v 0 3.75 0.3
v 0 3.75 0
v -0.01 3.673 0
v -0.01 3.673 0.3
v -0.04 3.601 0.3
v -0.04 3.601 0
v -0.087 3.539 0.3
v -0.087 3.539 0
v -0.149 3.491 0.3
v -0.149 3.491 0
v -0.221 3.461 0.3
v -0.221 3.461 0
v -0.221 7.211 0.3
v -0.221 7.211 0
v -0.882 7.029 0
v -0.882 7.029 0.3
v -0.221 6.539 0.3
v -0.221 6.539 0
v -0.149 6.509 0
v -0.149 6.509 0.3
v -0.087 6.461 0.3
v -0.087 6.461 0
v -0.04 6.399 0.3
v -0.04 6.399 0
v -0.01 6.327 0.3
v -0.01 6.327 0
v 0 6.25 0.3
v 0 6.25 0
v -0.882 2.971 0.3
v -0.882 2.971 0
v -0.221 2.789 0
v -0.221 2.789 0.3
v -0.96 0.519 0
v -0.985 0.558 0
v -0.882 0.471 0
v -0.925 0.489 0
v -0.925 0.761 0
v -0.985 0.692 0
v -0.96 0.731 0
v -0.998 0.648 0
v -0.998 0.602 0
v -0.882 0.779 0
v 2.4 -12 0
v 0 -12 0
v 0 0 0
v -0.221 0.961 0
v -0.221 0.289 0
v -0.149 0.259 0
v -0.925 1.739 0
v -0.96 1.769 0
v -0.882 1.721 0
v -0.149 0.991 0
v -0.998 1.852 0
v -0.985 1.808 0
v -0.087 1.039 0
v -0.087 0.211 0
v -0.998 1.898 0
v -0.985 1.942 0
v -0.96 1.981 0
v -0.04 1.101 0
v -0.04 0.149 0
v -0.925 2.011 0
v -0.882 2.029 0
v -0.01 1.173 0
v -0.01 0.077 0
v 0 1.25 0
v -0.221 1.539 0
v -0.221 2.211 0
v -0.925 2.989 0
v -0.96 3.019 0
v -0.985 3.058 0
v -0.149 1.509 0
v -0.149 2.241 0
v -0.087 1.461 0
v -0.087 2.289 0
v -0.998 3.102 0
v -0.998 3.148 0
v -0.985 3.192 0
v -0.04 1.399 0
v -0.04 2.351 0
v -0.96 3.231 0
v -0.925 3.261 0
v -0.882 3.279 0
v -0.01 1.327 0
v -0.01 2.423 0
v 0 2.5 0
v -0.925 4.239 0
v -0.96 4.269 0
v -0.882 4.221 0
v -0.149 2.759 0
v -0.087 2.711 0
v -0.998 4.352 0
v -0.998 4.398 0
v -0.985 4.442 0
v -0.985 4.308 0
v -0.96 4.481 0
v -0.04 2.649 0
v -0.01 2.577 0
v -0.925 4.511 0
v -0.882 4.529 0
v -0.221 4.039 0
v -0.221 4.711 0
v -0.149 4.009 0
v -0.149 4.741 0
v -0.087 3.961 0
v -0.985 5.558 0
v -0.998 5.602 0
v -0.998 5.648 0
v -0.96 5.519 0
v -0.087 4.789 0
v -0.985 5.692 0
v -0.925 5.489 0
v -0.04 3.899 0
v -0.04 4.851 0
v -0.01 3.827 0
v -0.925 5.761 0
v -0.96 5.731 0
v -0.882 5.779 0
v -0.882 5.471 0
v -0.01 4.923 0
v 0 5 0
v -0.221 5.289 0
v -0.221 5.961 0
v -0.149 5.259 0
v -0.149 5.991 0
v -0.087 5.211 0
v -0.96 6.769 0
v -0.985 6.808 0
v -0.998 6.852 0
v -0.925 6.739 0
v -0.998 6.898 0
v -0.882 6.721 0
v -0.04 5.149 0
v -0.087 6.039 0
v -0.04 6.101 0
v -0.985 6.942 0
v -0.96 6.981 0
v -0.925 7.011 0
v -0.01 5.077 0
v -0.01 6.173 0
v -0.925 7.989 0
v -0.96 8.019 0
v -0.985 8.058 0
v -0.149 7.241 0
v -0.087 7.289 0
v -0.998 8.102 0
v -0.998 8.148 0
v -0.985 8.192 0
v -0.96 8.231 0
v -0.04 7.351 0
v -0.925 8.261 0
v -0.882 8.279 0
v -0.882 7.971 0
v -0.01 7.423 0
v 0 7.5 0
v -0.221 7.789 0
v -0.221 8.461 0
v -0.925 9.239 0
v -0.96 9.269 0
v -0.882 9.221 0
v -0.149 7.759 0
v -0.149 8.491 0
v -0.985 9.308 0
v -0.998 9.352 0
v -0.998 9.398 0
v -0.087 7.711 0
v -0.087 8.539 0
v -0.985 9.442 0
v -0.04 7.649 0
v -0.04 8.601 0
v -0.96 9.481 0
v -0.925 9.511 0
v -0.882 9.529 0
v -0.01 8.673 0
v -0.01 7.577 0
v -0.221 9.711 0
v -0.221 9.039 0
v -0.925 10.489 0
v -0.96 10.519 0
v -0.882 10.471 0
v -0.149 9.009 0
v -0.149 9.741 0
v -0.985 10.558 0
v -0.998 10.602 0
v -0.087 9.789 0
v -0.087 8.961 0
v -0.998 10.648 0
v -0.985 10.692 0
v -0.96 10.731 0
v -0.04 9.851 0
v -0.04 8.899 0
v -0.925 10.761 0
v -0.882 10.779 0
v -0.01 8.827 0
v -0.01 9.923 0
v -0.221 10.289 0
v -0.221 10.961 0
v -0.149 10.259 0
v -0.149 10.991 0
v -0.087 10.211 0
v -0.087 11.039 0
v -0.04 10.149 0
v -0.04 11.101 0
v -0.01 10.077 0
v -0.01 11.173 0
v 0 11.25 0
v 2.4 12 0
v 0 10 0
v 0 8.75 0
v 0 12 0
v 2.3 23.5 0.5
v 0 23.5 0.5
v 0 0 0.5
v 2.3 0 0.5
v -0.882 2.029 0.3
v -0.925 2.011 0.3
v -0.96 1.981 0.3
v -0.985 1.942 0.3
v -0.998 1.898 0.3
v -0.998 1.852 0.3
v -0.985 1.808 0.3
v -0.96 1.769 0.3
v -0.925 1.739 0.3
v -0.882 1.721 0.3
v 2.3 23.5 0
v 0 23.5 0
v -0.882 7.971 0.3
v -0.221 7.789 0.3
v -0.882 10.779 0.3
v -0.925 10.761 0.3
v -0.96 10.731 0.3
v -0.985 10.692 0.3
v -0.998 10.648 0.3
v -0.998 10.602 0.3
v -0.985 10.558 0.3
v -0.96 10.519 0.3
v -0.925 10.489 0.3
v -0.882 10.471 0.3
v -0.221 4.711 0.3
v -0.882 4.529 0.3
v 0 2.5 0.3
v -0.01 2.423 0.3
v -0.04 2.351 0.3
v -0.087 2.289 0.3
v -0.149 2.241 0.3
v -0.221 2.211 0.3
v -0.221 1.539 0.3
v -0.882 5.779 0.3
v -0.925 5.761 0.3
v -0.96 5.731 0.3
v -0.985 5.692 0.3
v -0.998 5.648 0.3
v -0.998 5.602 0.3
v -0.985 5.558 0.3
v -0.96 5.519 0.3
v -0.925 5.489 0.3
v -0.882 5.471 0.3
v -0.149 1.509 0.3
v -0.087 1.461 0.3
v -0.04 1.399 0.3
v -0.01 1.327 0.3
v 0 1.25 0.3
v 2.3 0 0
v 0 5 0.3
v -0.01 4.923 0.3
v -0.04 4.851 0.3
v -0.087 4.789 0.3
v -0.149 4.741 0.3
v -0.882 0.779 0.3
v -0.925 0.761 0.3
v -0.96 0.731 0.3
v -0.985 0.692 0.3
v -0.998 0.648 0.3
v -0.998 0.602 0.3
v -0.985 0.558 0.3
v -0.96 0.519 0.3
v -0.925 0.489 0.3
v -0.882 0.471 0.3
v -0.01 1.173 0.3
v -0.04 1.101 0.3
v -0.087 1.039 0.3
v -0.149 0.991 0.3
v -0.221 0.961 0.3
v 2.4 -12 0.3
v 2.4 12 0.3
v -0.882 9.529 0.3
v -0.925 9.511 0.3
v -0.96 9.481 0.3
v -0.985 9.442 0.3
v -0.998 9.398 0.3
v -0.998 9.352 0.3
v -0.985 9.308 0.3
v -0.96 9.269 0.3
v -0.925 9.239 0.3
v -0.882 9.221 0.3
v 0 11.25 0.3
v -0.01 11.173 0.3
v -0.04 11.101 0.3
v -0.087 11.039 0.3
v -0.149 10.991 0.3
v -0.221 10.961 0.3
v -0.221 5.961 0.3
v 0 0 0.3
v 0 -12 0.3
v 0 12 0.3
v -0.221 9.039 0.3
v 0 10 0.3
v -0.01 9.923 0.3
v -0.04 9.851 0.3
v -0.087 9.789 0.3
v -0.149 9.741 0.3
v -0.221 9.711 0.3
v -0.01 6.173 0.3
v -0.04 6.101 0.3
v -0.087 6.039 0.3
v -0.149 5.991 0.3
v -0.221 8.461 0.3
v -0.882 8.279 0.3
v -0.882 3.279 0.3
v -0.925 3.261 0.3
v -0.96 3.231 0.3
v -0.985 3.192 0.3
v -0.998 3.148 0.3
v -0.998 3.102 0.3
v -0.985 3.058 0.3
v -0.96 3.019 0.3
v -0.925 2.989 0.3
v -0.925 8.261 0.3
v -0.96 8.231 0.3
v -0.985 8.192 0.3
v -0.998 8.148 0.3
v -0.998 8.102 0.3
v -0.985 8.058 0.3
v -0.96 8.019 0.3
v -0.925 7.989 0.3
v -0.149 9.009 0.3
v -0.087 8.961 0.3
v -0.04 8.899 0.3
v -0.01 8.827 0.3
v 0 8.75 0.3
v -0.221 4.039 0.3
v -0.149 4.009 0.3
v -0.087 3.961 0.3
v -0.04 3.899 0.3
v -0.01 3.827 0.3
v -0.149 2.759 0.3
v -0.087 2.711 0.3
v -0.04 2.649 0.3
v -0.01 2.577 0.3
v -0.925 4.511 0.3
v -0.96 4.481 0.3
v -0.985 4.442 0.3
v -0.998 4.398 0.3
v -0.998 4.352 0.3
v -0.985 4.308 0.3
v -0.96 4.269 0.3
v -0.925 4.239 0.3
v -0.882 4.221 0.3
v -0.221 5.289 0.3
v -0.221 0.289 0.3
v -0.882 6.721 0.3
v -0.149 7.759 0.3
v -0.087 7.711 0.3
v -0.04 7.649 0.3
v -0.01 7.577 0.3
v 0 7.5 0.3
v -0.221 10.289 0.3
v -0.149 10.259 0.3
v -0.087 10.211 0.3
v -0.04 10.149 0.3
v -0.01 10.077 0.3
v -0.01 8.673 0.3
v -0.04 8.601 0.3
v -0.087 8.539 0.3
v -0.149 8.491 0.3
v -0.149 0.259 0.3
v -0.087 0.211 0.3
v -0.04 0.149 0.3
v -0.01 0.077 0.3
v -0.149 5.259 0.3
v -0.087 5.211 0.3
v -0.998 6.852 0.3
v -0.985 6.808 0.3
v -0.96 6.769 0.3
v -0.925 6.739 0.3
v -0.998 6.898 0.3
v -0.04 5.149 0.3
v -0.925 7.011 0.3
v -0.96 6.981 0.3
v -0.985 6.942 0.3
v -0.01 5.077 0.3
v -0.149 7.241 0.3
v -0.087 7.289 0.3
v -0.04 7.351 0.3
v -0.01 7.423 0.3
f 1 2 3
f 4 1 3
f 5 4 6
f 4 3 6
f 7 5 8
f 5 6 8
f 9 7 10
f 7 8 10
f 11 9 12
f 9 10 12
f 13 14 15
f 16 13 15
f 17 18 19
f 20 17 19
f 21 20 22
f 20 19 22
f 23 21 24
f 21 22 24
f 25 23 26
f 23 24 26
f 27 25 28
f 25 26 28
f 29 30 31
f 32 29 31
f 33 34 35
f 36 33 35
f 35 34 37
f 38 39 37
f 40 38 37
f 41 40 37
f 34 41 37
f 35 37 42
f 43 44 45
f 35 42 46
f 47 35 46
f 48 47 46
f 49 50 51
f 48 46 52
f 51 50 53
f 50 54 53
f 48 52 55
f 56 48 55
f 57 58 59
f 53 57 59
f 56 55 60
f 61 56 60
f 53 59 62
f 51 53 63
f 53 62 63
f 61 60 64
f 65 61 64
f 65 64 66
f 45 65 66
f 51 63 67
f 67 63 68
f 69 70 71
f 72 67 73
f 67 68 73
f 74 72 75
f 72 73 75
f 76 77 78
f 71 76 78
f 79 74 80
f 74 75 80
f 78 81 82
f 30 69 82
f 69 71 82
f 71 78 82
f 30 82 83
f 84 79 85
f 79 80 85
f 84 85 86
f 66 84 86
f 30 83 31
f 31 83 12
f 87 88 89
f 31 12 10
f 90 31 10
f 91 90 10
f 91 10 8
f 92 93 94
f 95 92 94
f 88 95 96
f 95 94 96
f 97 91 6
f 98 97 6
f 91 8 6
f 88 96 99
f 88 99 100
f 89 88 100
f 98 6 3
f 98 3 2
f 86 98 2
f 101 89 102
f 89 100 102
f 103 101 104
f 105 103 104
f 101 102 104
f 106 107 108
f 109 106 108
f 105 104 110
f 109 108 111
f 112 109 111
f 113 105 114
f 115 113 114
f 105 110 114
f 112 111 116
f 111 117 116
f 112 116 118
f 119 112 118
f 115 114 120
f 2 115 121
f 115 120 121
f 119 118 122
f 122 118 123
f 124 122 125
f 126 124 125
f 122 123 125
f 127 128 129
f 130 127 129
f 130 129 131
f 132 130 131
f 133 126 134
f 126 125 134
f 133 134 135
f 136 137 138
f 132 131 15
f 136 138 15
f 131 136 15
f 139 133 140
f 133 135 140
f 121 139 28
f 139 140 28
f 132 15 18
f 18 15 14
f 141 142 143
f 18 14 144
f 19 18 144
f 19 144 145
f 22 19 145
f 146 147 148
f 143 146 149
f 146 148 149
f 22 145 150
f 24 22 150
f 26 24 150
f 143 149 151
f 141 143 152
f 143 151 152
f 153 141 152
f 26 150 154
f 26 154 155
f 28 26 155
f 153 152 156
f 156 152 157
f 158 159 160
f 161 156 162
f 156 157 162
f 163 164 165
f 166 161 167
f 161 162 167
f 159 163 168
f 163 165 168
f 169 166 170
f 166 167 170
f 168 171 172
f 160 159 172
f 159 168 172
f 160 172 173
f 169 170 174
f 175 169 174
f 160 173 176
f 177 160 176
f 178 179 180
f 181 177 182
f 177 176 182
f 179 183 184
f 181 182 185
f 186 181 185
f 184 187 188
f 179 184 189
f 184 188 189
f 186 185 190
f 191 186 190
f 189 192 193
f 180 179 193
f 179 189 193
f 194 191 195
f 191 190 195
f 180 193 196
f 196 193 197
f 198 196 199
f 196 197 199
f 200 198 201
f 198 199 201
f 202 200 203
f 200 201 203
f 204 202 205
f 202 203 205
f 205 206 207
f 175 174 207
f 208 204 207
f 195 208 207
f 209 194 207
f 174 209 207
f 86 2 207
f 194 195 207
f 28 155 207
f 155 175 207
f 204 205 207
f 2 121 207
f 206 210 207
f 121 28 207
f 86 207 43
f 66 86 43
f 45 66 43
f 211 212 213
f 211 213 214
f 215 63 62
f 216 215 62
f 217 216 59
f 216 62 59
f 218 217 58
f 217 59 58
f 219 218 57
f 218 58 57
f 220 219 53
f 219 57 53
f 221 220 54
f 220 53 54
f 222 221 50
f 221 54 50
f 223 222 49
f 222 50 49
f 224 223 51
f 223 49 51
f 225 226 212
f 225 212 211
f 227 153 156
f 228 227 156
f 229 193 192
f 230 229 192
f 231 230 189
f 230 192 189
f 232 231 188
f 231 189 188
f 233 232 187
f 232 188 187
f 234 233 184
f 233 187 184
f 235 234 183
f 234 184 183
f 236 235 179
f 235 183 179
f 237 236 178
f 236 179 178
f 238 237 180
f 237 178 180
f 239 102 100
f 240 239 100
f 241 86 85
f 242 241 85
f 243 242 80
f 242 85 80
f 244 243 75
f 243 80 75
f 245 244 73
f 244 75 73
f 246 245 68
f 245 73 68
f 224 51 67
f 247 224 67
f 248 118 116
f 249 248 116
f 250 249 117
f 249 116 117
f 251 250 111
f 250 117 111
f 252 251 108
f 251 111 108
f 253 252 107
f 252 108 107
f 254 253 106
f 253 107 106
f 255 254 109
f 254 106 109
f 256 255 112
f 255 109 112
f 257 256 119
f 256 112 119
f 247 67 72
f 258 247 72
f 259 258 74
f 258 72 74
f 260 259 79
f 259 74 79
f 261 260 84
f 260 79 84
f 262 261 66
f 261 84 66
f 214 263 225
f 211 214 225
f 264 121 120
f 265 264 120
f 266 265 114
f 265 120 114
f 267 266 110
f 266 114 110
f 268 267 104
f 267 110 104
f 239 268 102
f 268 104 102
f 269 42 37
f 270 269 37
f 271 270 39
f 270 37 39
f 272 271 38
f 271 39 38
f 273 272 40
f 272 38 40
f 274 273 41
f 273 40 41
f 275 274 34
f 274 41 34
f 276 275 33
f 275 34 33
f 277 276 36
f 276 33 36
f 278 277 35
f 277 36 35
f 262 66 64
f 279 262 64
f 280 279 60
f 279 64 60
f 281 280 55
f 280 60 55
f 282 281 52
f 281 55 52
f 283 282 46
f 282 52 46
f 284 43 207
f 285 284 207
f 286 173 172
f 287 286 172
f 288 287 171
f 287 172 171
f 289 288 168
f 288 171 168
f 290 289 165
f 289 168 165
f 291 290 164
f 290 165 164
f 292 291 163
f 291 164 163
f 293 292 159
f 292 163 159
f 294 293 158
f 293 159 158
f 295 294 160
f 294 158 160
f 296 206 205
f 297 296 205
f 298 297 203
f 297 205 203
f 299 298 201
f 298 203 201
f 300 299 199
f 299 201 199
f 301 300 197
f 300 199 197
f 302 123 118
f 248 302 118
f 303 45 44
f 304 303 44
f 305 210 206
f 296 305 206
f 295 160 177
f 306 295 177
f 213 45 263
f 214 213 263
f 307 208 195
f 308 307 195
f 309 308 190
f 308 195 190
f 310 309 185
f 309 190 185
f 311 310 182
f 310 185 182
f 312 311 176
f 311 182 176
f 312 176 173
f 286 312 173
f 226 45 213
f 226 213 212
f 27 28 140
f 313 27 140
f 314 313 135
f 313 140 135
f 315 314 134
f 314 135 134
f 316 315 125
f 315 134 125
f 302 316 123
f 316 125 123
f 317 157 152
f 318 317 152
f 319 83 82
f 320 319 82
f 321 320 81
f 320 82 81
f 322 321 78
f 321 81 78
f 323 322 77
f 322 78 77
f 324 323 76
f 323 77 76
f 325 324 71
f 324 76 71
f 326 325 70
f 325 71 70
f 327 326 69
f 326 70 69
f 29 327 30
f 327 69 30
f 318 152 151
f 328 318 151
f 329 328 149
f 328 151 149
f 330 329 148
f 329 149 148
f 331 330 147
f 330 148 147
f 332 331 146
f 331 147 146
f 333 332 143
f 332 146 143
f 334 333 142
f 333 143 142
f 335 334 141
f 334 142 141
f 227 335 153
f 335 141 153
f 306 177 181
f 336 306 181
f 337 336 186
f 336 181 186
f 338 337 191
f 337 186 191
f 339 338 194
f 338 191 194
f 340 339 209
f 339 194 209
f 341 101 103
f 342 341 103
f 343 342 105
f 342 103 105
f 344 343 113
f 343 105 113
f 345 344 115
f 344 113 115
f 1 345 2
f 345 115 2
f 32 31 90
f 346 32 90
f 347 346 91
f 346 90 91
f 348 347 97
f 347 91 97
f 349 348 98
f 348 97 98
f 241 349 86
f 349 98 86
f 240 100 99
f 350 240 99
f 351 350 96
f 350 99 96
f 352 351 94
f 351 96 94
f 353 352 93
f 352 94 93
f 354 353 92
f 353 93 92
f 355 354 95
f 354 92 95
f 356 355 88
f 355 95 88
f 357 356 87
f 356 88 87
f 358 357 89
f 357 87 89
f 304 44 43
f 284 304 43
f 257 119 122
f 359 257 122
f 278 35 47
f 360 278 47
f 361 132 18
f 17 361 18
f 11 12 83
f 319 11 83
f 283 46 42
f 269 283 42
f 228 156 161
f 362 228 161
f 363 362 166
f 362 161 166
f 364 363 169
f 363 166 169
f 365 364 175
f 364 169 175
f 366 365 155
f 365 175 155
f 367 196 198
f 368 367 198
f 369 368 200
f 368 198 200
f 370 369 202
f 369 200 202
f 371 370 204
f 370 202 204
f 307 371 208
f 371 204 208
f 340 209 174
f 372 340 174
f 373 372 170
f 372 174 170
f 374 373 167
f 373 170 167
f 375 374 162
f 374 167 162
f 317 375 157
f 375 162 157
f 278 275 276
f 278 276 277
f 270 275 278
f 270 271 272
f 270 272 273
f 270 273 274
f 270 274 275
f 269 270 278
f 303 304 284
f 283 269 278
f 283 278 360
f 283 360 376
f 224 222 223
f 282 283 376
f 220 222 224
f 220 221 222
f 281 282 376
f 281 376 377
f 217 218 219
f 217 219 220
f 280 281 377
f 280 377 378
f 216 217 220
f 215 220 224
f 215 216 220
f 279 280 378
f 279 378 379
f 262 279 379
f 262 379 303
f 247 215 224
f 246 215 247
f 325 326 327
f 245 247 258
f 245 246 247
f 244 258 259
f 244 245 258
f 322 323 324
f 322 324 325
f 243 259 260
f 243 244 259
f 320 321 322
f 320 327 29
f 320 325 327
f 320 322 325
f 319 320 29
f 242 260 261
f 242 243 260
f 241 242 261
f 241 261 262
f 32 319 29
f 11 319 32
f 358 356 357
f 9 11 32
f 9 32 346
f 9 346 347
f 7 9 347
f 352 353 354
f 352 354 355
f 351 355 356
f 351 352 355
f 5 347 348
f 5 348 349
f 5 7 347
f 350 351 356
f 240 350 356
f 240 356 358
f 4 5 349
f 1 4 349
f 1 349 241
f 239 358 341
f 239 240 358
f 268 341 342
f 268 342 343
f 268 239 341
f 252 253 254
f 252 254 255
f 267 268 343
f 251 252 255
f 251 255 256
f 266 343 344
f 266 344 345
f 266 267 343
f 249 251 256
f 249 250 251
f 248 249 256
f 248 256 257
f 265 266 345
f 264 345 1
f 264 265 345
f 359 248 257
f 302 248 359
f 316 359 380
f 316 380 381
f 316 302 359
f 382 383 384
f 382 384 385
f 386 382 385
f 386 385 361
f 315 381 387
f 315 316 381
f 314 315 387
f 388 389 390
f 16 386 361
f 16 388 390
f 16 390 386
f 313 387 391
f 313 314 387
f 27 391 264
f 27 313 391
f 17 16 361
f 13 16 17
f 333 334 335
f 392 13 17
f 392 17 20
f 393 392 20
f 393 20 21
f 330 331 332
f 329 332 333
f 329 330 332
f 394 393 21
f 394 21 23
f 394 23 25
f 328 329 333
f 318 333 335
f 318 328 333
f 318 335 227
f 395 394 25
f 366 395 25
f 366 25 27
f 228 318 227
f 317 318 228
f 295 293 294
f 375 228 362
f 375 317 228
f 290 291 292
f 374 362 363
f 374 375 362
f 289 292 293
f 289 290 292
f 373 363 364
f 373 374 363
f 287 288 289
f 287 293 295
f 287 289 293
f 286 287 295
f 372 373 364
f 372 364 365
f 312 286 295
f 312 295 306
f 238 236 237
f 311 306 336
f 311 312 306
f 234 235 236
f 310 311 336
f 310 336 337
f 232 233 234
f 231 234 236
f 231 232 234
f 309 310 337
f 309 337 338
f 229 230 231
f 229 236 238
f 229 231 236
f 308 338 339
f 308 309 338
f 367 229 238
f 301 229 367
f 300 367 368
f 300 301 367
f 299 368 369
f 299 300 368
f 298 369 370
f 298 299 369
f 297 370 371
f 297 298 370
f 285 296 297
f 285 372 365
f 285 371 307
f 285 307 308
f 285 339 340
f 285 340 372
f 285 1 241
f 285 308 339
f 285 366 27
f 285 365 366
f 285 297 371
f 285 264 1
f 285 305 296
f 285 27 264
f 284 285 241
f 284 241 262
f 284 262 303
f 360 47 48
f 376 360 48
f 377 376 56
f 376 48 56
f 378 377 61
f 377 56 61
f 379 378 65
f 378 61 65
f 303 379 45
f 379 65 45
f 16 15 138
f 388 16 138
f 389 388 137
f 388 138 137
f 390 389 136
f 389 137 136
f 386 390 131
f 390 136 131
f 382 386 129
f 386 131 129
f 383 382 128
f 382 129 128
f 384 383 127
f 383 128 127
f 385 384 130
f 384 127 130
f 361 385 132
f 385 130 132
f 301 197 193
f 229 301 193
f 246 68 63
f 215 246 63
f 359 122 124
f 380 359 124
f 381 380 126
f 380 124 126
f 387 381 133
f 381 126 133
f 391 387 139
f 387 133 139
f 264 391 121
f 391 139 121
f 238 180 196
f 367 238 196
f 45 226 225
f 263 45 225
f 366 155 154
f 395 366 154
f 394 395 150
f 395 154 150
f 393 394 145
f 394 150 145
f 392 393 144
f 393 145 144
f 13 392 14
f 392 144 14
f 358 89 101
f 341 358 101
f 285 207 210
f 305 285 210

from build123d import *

# Parameters (mm, degrees)
F1_DEPTH = 0.3
F2_W     = 2.3
F2_H     = 23.5
F3_DEPTH = 0.5


with BuildPart() as f1:
    # F0 (on Top) → F1 (new body)
    with BuildSketch(Plane.XY):
        with BuildLine():
            Line((0, 10), (0, 11.25))
            ThreePointArc((0, 11.25), (-0.061469, 11.068057), (-0.220688, 10.960674))
            Line((-0.220688, 10.960674), (-0.8823, 10.779307))
            ThreePointArc((-0.8823, 10.779307), (-1, 10.625), (-0.8823, 10.470693))
            Line((-0.8823, 10.470693), (-0.220688, 10.289326))
            ThreePointArc((-0.220688, 10.289326), (-0.061469, 10.181943), (0, 10))
        make_face()
        with BuildLine():
            Line((0, 8.75), (0, 10))
            ThreePointArc((0, 10), (-0.061469, 9.818057), (-0.220688, 9.710674))
            Line((-0.220688, 9.710674), (-0.8823, 9.529307))
            ThreePointArc((-0.8823, 9.529307), (-1, 9.375), (-0.8823, 9.220693))
            Line((-0.8823, 9.220693), (-0.220688, 9.039326))
            ThreePointArc((-0.220688, 9.039326), (-0.061469, 8.931943), (0, 8.75))
        make_face()
        with BuildLine():
            Line((0, 7.5), (0, 8.75))
            ThreePointArc((0, 8.75), (-0.061469, 8.568057), (-0.220688, 8.460674))
            Line((-0.220688, 8.460674), (-0.8823, 8.279307))
            ThreePointArc((-0.8823, 8.279307), (-1, 8.125), (-0.8823, 7.970693))
            Line((-0.8823, 7.970693), (-0.220688, 7.789326))
            ThreePointArc((-0.220688, 7.789326), (-0.061469, 7.681943), (0, 7.5))
        make_face()
        with BuildLine():
            Line((0, 6.25), (0, 7.5))
            ThreePointArc((0, 7.5), (-0.061469, 7.318057), (-0.220688, 7.210674))
            Line((-0.220688, 7.210674), (-0.8823, 7.029307))
            ThreePointArc((-0.8823, 7.029307), (-1, 6.875), (-0.8823, 6.720693))
            Line((-0.8823, 6.720693), (-0.220688, 6.539326))
            ThreePointArc((-0.220688, 6.539326), (-0.061469, 6.431943), (0, 6.25))
        make_face()
        with BuildLine():
            Line((0, 5), (0, 6.25))
            ThreePointArc((0, 6.25), (-0.061469, 6.068057), (-0.220688, 5.960674))
            Line((-0.220688, 5.960674), (-0.8823, 5.779307))
            ThreePointArc((-0.8823, 5.779307), (-1, 5.625), (-0.8823, 5.470693))
            Line((-0.8823, 5.470693), (-0.220688, 5.289326))
            ThreePointArc((-0.220688, 5.289326), (-0.061469, 5.181943), (0, 5))
        make_face()
        with BuildLine():
            Line((0, 3.75), (0, 5))
            ThreePointArc((0, 5), (-0.061469, 4.818057), (-0.220688, 4.710674))
            Line((-0.220688, 4.710674), (-0.8823, 4.529307))
            ThreePointArc((-0.8823, 4.529307), (-1, 4.375), (-0.8823, 4.220693))
            Line((-0.8823, 4.220693), (-0.220688, 4.039326))
            ThreePointArc((-0.220688, 4.039326), (-0.061469, 3.931943), (0, 3.75))
        make_face()
        with BuildLine():
            ThreePointArc((-0.220688, 2.789326), (-0.061469, 2.681943), (0, 2.5))
            Line((0, 2.5), (0, 3.75))
            ThreePointArc((0, 3.75), (-0.061469, 3.568057), (-0.220688, 3.460674))
            Line((-0.220688, 3.460674), (-0.8823, 3.279307))
            ThreePointArc((-0.8823, 3.279307), (-1, 3.125), (-0.8823, 2.970693))
            Line((-0.8823, 2.970693), (-0.220688, 2.789326))
        make_face()
        with BuildLine():
            ThreePointArc((-0.220688, 1.539326), (-0.061469, 1.431943), (0, 1.25))
            Line((0, 1.25), (0, 2.5))
            ThreePointArc((0, 2.5), (-0.061469, 2.318057), (-0.220688, 2.210674))
            Line((-0.220688, 2.210674), (-0.8823, 2.029307))
            ThreePointArc((-0.8823, 2.029307), (-1, 1.875), (-0.8823, 1.720693))
            Line((-0.8823, 1.720693), (-0.220688, 1.539326))
        make_face()
        with BuildLine():
            ThreePointArc((-0.220688, 0.289326), (-0.061469, 0.181943), (0, 0))
            Line((0, 0), (0, 1.25))
            ThreePointArc((0, 1.25), (-0.061469, 1.068057), (-0.220688, 0.960674))
            Line((-0.220688, 0.960674), (-0.8823, 0.779307))
            ThreePointArc((-0.8823, 0.779307), (-1, 0.625), (-0.8823, 0.470693))
            Line((-0.8823, 0.470693), (-0.220688, 0.289326))
        make_face()
        Polygon((2.4, 12), (0, 12), (0, 11.25), (0, 10), (0, 8.75), (0, 7.5), (0, 6.25), (0, 5), (0, 3.75), (0, 2.5), (0, 1.25), (0, 0), (0, -12), (2.4, -12), align=None)
    extrude(amount=F1_DEPTH)


with BuildPart() as f3:
    # F2 (on Top) → F3 (new body)
    with BuildSketch(Plane.XY):
        with Locations((1.15, 11.75)):
            Rectangle(F2_W, F2_H)
    extrude(amount=F3_DEPTH)


solid = Compound([f1.part, f3.part])
